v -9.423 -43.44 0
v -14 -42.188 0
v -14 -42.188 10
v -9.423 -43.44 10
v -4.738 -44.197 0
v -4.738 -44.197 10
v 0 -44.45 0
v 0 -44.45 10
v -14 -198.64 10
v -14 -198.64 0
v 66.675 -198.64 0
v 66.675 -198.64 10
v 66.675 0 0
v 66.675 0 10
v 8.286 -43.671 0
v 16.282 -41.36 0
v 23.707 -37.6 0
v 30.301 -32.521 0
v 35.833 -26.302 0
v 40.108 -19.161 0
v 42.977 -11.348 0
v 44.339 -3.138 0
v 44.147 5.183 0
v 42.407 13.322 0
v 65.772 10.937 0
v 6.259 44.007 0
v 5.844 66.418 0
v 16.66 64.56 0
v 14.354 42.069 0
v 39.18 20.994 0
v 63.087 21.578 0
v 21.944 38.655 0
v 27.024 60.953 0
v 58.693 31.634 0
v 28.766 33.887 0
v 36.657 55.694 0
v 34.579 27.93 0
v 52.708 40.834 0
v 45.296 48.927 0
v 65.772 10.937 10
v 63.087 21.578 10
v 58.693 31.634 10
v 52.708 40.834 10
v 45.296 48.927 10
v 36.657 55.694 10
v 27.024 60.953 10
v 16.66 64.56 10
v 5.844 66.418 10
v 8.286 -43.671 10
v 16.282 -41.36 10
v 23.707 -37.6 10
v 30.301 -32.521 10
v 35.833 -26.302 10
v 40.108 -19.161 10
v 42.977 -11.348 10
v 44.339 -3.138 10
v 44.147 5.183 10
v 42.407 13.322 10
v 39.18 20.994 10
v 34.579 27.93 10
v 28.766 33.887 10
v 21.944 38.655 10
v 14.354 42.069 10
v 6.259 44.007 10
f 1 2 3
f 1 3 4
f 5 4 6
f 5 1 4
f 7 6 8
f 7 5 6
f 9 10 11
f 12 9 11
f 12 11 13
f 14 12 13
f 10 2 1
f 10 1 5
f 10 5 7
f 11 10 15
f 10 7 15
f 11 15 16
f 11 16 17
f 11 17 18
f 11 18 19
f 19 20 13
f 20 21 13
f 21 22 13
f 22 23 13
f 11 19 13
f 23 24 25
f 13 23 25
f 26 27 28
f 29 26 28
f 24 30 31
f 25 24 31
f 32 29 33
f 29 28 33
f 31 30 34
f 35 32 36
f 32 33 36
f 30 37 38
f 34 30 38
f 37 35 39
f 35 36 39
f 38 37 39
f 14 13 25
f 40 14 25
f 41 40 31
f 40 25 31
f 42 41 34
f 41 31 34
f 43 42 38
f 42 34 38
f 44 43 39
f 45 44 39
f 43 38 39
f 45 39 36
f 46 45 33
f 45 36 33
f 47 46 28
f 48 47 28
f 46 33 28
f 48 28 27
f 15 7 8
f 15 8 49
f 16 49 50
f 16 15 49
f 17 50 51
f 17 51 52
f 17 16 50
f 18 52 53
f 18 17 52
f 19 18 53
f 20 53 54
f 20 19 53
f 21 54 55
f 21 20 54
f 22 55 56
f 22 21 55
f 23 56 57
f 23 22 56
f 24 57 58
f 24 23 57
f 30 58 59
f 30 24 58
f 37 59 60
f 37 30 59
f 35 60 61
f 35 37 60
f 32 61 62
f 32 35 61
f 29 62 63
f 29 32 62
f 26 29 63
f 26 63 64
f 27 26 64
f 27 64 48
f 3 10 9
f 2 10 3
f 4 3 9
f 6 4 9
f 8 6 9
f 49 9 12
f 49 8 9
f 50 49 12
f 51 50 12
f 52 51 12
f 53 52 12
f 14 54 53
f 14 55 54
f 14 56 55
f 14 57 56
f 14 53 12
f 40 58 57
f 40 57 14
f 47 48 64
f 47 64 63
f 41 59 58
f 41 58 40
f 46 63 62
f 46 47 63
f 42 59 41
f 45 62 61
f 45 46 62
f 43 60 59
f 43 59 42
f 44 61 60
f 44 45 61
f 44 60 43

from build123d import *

# Parameters (mm, degrees)
PAD_DEPTH = 10


with BuildPart() as part:
    # Sketch → Pad (new body)
    with BuildSketch(Plane.XY):
        with BuildLine():
            Line((66.675, -198.640068), (66.675, 0))
            ThreePointArc((66.675, 0), (49.1691, 45.032823), (5.843948, 66.4184))
            Line((6.259361, 44.007078), (5.843948, 66.4184))
            ThreePointArc((0, -44.45), (44.339131, -3.137506), (6.259361, 44.007078))
            ThreePointArc((-14, -42.187706), (-7.090803, -43.880782), (0, -44.45))
            Line((-14, -198.640068), (-14, -42.187706))
            Line((0, -198.640068), (-14, -198.640068))
            Line((0, -198.640068), (66.675, -198.640068))
        make_face()
    extrude(amount=PAD_DEPTH)


solid = part.part
